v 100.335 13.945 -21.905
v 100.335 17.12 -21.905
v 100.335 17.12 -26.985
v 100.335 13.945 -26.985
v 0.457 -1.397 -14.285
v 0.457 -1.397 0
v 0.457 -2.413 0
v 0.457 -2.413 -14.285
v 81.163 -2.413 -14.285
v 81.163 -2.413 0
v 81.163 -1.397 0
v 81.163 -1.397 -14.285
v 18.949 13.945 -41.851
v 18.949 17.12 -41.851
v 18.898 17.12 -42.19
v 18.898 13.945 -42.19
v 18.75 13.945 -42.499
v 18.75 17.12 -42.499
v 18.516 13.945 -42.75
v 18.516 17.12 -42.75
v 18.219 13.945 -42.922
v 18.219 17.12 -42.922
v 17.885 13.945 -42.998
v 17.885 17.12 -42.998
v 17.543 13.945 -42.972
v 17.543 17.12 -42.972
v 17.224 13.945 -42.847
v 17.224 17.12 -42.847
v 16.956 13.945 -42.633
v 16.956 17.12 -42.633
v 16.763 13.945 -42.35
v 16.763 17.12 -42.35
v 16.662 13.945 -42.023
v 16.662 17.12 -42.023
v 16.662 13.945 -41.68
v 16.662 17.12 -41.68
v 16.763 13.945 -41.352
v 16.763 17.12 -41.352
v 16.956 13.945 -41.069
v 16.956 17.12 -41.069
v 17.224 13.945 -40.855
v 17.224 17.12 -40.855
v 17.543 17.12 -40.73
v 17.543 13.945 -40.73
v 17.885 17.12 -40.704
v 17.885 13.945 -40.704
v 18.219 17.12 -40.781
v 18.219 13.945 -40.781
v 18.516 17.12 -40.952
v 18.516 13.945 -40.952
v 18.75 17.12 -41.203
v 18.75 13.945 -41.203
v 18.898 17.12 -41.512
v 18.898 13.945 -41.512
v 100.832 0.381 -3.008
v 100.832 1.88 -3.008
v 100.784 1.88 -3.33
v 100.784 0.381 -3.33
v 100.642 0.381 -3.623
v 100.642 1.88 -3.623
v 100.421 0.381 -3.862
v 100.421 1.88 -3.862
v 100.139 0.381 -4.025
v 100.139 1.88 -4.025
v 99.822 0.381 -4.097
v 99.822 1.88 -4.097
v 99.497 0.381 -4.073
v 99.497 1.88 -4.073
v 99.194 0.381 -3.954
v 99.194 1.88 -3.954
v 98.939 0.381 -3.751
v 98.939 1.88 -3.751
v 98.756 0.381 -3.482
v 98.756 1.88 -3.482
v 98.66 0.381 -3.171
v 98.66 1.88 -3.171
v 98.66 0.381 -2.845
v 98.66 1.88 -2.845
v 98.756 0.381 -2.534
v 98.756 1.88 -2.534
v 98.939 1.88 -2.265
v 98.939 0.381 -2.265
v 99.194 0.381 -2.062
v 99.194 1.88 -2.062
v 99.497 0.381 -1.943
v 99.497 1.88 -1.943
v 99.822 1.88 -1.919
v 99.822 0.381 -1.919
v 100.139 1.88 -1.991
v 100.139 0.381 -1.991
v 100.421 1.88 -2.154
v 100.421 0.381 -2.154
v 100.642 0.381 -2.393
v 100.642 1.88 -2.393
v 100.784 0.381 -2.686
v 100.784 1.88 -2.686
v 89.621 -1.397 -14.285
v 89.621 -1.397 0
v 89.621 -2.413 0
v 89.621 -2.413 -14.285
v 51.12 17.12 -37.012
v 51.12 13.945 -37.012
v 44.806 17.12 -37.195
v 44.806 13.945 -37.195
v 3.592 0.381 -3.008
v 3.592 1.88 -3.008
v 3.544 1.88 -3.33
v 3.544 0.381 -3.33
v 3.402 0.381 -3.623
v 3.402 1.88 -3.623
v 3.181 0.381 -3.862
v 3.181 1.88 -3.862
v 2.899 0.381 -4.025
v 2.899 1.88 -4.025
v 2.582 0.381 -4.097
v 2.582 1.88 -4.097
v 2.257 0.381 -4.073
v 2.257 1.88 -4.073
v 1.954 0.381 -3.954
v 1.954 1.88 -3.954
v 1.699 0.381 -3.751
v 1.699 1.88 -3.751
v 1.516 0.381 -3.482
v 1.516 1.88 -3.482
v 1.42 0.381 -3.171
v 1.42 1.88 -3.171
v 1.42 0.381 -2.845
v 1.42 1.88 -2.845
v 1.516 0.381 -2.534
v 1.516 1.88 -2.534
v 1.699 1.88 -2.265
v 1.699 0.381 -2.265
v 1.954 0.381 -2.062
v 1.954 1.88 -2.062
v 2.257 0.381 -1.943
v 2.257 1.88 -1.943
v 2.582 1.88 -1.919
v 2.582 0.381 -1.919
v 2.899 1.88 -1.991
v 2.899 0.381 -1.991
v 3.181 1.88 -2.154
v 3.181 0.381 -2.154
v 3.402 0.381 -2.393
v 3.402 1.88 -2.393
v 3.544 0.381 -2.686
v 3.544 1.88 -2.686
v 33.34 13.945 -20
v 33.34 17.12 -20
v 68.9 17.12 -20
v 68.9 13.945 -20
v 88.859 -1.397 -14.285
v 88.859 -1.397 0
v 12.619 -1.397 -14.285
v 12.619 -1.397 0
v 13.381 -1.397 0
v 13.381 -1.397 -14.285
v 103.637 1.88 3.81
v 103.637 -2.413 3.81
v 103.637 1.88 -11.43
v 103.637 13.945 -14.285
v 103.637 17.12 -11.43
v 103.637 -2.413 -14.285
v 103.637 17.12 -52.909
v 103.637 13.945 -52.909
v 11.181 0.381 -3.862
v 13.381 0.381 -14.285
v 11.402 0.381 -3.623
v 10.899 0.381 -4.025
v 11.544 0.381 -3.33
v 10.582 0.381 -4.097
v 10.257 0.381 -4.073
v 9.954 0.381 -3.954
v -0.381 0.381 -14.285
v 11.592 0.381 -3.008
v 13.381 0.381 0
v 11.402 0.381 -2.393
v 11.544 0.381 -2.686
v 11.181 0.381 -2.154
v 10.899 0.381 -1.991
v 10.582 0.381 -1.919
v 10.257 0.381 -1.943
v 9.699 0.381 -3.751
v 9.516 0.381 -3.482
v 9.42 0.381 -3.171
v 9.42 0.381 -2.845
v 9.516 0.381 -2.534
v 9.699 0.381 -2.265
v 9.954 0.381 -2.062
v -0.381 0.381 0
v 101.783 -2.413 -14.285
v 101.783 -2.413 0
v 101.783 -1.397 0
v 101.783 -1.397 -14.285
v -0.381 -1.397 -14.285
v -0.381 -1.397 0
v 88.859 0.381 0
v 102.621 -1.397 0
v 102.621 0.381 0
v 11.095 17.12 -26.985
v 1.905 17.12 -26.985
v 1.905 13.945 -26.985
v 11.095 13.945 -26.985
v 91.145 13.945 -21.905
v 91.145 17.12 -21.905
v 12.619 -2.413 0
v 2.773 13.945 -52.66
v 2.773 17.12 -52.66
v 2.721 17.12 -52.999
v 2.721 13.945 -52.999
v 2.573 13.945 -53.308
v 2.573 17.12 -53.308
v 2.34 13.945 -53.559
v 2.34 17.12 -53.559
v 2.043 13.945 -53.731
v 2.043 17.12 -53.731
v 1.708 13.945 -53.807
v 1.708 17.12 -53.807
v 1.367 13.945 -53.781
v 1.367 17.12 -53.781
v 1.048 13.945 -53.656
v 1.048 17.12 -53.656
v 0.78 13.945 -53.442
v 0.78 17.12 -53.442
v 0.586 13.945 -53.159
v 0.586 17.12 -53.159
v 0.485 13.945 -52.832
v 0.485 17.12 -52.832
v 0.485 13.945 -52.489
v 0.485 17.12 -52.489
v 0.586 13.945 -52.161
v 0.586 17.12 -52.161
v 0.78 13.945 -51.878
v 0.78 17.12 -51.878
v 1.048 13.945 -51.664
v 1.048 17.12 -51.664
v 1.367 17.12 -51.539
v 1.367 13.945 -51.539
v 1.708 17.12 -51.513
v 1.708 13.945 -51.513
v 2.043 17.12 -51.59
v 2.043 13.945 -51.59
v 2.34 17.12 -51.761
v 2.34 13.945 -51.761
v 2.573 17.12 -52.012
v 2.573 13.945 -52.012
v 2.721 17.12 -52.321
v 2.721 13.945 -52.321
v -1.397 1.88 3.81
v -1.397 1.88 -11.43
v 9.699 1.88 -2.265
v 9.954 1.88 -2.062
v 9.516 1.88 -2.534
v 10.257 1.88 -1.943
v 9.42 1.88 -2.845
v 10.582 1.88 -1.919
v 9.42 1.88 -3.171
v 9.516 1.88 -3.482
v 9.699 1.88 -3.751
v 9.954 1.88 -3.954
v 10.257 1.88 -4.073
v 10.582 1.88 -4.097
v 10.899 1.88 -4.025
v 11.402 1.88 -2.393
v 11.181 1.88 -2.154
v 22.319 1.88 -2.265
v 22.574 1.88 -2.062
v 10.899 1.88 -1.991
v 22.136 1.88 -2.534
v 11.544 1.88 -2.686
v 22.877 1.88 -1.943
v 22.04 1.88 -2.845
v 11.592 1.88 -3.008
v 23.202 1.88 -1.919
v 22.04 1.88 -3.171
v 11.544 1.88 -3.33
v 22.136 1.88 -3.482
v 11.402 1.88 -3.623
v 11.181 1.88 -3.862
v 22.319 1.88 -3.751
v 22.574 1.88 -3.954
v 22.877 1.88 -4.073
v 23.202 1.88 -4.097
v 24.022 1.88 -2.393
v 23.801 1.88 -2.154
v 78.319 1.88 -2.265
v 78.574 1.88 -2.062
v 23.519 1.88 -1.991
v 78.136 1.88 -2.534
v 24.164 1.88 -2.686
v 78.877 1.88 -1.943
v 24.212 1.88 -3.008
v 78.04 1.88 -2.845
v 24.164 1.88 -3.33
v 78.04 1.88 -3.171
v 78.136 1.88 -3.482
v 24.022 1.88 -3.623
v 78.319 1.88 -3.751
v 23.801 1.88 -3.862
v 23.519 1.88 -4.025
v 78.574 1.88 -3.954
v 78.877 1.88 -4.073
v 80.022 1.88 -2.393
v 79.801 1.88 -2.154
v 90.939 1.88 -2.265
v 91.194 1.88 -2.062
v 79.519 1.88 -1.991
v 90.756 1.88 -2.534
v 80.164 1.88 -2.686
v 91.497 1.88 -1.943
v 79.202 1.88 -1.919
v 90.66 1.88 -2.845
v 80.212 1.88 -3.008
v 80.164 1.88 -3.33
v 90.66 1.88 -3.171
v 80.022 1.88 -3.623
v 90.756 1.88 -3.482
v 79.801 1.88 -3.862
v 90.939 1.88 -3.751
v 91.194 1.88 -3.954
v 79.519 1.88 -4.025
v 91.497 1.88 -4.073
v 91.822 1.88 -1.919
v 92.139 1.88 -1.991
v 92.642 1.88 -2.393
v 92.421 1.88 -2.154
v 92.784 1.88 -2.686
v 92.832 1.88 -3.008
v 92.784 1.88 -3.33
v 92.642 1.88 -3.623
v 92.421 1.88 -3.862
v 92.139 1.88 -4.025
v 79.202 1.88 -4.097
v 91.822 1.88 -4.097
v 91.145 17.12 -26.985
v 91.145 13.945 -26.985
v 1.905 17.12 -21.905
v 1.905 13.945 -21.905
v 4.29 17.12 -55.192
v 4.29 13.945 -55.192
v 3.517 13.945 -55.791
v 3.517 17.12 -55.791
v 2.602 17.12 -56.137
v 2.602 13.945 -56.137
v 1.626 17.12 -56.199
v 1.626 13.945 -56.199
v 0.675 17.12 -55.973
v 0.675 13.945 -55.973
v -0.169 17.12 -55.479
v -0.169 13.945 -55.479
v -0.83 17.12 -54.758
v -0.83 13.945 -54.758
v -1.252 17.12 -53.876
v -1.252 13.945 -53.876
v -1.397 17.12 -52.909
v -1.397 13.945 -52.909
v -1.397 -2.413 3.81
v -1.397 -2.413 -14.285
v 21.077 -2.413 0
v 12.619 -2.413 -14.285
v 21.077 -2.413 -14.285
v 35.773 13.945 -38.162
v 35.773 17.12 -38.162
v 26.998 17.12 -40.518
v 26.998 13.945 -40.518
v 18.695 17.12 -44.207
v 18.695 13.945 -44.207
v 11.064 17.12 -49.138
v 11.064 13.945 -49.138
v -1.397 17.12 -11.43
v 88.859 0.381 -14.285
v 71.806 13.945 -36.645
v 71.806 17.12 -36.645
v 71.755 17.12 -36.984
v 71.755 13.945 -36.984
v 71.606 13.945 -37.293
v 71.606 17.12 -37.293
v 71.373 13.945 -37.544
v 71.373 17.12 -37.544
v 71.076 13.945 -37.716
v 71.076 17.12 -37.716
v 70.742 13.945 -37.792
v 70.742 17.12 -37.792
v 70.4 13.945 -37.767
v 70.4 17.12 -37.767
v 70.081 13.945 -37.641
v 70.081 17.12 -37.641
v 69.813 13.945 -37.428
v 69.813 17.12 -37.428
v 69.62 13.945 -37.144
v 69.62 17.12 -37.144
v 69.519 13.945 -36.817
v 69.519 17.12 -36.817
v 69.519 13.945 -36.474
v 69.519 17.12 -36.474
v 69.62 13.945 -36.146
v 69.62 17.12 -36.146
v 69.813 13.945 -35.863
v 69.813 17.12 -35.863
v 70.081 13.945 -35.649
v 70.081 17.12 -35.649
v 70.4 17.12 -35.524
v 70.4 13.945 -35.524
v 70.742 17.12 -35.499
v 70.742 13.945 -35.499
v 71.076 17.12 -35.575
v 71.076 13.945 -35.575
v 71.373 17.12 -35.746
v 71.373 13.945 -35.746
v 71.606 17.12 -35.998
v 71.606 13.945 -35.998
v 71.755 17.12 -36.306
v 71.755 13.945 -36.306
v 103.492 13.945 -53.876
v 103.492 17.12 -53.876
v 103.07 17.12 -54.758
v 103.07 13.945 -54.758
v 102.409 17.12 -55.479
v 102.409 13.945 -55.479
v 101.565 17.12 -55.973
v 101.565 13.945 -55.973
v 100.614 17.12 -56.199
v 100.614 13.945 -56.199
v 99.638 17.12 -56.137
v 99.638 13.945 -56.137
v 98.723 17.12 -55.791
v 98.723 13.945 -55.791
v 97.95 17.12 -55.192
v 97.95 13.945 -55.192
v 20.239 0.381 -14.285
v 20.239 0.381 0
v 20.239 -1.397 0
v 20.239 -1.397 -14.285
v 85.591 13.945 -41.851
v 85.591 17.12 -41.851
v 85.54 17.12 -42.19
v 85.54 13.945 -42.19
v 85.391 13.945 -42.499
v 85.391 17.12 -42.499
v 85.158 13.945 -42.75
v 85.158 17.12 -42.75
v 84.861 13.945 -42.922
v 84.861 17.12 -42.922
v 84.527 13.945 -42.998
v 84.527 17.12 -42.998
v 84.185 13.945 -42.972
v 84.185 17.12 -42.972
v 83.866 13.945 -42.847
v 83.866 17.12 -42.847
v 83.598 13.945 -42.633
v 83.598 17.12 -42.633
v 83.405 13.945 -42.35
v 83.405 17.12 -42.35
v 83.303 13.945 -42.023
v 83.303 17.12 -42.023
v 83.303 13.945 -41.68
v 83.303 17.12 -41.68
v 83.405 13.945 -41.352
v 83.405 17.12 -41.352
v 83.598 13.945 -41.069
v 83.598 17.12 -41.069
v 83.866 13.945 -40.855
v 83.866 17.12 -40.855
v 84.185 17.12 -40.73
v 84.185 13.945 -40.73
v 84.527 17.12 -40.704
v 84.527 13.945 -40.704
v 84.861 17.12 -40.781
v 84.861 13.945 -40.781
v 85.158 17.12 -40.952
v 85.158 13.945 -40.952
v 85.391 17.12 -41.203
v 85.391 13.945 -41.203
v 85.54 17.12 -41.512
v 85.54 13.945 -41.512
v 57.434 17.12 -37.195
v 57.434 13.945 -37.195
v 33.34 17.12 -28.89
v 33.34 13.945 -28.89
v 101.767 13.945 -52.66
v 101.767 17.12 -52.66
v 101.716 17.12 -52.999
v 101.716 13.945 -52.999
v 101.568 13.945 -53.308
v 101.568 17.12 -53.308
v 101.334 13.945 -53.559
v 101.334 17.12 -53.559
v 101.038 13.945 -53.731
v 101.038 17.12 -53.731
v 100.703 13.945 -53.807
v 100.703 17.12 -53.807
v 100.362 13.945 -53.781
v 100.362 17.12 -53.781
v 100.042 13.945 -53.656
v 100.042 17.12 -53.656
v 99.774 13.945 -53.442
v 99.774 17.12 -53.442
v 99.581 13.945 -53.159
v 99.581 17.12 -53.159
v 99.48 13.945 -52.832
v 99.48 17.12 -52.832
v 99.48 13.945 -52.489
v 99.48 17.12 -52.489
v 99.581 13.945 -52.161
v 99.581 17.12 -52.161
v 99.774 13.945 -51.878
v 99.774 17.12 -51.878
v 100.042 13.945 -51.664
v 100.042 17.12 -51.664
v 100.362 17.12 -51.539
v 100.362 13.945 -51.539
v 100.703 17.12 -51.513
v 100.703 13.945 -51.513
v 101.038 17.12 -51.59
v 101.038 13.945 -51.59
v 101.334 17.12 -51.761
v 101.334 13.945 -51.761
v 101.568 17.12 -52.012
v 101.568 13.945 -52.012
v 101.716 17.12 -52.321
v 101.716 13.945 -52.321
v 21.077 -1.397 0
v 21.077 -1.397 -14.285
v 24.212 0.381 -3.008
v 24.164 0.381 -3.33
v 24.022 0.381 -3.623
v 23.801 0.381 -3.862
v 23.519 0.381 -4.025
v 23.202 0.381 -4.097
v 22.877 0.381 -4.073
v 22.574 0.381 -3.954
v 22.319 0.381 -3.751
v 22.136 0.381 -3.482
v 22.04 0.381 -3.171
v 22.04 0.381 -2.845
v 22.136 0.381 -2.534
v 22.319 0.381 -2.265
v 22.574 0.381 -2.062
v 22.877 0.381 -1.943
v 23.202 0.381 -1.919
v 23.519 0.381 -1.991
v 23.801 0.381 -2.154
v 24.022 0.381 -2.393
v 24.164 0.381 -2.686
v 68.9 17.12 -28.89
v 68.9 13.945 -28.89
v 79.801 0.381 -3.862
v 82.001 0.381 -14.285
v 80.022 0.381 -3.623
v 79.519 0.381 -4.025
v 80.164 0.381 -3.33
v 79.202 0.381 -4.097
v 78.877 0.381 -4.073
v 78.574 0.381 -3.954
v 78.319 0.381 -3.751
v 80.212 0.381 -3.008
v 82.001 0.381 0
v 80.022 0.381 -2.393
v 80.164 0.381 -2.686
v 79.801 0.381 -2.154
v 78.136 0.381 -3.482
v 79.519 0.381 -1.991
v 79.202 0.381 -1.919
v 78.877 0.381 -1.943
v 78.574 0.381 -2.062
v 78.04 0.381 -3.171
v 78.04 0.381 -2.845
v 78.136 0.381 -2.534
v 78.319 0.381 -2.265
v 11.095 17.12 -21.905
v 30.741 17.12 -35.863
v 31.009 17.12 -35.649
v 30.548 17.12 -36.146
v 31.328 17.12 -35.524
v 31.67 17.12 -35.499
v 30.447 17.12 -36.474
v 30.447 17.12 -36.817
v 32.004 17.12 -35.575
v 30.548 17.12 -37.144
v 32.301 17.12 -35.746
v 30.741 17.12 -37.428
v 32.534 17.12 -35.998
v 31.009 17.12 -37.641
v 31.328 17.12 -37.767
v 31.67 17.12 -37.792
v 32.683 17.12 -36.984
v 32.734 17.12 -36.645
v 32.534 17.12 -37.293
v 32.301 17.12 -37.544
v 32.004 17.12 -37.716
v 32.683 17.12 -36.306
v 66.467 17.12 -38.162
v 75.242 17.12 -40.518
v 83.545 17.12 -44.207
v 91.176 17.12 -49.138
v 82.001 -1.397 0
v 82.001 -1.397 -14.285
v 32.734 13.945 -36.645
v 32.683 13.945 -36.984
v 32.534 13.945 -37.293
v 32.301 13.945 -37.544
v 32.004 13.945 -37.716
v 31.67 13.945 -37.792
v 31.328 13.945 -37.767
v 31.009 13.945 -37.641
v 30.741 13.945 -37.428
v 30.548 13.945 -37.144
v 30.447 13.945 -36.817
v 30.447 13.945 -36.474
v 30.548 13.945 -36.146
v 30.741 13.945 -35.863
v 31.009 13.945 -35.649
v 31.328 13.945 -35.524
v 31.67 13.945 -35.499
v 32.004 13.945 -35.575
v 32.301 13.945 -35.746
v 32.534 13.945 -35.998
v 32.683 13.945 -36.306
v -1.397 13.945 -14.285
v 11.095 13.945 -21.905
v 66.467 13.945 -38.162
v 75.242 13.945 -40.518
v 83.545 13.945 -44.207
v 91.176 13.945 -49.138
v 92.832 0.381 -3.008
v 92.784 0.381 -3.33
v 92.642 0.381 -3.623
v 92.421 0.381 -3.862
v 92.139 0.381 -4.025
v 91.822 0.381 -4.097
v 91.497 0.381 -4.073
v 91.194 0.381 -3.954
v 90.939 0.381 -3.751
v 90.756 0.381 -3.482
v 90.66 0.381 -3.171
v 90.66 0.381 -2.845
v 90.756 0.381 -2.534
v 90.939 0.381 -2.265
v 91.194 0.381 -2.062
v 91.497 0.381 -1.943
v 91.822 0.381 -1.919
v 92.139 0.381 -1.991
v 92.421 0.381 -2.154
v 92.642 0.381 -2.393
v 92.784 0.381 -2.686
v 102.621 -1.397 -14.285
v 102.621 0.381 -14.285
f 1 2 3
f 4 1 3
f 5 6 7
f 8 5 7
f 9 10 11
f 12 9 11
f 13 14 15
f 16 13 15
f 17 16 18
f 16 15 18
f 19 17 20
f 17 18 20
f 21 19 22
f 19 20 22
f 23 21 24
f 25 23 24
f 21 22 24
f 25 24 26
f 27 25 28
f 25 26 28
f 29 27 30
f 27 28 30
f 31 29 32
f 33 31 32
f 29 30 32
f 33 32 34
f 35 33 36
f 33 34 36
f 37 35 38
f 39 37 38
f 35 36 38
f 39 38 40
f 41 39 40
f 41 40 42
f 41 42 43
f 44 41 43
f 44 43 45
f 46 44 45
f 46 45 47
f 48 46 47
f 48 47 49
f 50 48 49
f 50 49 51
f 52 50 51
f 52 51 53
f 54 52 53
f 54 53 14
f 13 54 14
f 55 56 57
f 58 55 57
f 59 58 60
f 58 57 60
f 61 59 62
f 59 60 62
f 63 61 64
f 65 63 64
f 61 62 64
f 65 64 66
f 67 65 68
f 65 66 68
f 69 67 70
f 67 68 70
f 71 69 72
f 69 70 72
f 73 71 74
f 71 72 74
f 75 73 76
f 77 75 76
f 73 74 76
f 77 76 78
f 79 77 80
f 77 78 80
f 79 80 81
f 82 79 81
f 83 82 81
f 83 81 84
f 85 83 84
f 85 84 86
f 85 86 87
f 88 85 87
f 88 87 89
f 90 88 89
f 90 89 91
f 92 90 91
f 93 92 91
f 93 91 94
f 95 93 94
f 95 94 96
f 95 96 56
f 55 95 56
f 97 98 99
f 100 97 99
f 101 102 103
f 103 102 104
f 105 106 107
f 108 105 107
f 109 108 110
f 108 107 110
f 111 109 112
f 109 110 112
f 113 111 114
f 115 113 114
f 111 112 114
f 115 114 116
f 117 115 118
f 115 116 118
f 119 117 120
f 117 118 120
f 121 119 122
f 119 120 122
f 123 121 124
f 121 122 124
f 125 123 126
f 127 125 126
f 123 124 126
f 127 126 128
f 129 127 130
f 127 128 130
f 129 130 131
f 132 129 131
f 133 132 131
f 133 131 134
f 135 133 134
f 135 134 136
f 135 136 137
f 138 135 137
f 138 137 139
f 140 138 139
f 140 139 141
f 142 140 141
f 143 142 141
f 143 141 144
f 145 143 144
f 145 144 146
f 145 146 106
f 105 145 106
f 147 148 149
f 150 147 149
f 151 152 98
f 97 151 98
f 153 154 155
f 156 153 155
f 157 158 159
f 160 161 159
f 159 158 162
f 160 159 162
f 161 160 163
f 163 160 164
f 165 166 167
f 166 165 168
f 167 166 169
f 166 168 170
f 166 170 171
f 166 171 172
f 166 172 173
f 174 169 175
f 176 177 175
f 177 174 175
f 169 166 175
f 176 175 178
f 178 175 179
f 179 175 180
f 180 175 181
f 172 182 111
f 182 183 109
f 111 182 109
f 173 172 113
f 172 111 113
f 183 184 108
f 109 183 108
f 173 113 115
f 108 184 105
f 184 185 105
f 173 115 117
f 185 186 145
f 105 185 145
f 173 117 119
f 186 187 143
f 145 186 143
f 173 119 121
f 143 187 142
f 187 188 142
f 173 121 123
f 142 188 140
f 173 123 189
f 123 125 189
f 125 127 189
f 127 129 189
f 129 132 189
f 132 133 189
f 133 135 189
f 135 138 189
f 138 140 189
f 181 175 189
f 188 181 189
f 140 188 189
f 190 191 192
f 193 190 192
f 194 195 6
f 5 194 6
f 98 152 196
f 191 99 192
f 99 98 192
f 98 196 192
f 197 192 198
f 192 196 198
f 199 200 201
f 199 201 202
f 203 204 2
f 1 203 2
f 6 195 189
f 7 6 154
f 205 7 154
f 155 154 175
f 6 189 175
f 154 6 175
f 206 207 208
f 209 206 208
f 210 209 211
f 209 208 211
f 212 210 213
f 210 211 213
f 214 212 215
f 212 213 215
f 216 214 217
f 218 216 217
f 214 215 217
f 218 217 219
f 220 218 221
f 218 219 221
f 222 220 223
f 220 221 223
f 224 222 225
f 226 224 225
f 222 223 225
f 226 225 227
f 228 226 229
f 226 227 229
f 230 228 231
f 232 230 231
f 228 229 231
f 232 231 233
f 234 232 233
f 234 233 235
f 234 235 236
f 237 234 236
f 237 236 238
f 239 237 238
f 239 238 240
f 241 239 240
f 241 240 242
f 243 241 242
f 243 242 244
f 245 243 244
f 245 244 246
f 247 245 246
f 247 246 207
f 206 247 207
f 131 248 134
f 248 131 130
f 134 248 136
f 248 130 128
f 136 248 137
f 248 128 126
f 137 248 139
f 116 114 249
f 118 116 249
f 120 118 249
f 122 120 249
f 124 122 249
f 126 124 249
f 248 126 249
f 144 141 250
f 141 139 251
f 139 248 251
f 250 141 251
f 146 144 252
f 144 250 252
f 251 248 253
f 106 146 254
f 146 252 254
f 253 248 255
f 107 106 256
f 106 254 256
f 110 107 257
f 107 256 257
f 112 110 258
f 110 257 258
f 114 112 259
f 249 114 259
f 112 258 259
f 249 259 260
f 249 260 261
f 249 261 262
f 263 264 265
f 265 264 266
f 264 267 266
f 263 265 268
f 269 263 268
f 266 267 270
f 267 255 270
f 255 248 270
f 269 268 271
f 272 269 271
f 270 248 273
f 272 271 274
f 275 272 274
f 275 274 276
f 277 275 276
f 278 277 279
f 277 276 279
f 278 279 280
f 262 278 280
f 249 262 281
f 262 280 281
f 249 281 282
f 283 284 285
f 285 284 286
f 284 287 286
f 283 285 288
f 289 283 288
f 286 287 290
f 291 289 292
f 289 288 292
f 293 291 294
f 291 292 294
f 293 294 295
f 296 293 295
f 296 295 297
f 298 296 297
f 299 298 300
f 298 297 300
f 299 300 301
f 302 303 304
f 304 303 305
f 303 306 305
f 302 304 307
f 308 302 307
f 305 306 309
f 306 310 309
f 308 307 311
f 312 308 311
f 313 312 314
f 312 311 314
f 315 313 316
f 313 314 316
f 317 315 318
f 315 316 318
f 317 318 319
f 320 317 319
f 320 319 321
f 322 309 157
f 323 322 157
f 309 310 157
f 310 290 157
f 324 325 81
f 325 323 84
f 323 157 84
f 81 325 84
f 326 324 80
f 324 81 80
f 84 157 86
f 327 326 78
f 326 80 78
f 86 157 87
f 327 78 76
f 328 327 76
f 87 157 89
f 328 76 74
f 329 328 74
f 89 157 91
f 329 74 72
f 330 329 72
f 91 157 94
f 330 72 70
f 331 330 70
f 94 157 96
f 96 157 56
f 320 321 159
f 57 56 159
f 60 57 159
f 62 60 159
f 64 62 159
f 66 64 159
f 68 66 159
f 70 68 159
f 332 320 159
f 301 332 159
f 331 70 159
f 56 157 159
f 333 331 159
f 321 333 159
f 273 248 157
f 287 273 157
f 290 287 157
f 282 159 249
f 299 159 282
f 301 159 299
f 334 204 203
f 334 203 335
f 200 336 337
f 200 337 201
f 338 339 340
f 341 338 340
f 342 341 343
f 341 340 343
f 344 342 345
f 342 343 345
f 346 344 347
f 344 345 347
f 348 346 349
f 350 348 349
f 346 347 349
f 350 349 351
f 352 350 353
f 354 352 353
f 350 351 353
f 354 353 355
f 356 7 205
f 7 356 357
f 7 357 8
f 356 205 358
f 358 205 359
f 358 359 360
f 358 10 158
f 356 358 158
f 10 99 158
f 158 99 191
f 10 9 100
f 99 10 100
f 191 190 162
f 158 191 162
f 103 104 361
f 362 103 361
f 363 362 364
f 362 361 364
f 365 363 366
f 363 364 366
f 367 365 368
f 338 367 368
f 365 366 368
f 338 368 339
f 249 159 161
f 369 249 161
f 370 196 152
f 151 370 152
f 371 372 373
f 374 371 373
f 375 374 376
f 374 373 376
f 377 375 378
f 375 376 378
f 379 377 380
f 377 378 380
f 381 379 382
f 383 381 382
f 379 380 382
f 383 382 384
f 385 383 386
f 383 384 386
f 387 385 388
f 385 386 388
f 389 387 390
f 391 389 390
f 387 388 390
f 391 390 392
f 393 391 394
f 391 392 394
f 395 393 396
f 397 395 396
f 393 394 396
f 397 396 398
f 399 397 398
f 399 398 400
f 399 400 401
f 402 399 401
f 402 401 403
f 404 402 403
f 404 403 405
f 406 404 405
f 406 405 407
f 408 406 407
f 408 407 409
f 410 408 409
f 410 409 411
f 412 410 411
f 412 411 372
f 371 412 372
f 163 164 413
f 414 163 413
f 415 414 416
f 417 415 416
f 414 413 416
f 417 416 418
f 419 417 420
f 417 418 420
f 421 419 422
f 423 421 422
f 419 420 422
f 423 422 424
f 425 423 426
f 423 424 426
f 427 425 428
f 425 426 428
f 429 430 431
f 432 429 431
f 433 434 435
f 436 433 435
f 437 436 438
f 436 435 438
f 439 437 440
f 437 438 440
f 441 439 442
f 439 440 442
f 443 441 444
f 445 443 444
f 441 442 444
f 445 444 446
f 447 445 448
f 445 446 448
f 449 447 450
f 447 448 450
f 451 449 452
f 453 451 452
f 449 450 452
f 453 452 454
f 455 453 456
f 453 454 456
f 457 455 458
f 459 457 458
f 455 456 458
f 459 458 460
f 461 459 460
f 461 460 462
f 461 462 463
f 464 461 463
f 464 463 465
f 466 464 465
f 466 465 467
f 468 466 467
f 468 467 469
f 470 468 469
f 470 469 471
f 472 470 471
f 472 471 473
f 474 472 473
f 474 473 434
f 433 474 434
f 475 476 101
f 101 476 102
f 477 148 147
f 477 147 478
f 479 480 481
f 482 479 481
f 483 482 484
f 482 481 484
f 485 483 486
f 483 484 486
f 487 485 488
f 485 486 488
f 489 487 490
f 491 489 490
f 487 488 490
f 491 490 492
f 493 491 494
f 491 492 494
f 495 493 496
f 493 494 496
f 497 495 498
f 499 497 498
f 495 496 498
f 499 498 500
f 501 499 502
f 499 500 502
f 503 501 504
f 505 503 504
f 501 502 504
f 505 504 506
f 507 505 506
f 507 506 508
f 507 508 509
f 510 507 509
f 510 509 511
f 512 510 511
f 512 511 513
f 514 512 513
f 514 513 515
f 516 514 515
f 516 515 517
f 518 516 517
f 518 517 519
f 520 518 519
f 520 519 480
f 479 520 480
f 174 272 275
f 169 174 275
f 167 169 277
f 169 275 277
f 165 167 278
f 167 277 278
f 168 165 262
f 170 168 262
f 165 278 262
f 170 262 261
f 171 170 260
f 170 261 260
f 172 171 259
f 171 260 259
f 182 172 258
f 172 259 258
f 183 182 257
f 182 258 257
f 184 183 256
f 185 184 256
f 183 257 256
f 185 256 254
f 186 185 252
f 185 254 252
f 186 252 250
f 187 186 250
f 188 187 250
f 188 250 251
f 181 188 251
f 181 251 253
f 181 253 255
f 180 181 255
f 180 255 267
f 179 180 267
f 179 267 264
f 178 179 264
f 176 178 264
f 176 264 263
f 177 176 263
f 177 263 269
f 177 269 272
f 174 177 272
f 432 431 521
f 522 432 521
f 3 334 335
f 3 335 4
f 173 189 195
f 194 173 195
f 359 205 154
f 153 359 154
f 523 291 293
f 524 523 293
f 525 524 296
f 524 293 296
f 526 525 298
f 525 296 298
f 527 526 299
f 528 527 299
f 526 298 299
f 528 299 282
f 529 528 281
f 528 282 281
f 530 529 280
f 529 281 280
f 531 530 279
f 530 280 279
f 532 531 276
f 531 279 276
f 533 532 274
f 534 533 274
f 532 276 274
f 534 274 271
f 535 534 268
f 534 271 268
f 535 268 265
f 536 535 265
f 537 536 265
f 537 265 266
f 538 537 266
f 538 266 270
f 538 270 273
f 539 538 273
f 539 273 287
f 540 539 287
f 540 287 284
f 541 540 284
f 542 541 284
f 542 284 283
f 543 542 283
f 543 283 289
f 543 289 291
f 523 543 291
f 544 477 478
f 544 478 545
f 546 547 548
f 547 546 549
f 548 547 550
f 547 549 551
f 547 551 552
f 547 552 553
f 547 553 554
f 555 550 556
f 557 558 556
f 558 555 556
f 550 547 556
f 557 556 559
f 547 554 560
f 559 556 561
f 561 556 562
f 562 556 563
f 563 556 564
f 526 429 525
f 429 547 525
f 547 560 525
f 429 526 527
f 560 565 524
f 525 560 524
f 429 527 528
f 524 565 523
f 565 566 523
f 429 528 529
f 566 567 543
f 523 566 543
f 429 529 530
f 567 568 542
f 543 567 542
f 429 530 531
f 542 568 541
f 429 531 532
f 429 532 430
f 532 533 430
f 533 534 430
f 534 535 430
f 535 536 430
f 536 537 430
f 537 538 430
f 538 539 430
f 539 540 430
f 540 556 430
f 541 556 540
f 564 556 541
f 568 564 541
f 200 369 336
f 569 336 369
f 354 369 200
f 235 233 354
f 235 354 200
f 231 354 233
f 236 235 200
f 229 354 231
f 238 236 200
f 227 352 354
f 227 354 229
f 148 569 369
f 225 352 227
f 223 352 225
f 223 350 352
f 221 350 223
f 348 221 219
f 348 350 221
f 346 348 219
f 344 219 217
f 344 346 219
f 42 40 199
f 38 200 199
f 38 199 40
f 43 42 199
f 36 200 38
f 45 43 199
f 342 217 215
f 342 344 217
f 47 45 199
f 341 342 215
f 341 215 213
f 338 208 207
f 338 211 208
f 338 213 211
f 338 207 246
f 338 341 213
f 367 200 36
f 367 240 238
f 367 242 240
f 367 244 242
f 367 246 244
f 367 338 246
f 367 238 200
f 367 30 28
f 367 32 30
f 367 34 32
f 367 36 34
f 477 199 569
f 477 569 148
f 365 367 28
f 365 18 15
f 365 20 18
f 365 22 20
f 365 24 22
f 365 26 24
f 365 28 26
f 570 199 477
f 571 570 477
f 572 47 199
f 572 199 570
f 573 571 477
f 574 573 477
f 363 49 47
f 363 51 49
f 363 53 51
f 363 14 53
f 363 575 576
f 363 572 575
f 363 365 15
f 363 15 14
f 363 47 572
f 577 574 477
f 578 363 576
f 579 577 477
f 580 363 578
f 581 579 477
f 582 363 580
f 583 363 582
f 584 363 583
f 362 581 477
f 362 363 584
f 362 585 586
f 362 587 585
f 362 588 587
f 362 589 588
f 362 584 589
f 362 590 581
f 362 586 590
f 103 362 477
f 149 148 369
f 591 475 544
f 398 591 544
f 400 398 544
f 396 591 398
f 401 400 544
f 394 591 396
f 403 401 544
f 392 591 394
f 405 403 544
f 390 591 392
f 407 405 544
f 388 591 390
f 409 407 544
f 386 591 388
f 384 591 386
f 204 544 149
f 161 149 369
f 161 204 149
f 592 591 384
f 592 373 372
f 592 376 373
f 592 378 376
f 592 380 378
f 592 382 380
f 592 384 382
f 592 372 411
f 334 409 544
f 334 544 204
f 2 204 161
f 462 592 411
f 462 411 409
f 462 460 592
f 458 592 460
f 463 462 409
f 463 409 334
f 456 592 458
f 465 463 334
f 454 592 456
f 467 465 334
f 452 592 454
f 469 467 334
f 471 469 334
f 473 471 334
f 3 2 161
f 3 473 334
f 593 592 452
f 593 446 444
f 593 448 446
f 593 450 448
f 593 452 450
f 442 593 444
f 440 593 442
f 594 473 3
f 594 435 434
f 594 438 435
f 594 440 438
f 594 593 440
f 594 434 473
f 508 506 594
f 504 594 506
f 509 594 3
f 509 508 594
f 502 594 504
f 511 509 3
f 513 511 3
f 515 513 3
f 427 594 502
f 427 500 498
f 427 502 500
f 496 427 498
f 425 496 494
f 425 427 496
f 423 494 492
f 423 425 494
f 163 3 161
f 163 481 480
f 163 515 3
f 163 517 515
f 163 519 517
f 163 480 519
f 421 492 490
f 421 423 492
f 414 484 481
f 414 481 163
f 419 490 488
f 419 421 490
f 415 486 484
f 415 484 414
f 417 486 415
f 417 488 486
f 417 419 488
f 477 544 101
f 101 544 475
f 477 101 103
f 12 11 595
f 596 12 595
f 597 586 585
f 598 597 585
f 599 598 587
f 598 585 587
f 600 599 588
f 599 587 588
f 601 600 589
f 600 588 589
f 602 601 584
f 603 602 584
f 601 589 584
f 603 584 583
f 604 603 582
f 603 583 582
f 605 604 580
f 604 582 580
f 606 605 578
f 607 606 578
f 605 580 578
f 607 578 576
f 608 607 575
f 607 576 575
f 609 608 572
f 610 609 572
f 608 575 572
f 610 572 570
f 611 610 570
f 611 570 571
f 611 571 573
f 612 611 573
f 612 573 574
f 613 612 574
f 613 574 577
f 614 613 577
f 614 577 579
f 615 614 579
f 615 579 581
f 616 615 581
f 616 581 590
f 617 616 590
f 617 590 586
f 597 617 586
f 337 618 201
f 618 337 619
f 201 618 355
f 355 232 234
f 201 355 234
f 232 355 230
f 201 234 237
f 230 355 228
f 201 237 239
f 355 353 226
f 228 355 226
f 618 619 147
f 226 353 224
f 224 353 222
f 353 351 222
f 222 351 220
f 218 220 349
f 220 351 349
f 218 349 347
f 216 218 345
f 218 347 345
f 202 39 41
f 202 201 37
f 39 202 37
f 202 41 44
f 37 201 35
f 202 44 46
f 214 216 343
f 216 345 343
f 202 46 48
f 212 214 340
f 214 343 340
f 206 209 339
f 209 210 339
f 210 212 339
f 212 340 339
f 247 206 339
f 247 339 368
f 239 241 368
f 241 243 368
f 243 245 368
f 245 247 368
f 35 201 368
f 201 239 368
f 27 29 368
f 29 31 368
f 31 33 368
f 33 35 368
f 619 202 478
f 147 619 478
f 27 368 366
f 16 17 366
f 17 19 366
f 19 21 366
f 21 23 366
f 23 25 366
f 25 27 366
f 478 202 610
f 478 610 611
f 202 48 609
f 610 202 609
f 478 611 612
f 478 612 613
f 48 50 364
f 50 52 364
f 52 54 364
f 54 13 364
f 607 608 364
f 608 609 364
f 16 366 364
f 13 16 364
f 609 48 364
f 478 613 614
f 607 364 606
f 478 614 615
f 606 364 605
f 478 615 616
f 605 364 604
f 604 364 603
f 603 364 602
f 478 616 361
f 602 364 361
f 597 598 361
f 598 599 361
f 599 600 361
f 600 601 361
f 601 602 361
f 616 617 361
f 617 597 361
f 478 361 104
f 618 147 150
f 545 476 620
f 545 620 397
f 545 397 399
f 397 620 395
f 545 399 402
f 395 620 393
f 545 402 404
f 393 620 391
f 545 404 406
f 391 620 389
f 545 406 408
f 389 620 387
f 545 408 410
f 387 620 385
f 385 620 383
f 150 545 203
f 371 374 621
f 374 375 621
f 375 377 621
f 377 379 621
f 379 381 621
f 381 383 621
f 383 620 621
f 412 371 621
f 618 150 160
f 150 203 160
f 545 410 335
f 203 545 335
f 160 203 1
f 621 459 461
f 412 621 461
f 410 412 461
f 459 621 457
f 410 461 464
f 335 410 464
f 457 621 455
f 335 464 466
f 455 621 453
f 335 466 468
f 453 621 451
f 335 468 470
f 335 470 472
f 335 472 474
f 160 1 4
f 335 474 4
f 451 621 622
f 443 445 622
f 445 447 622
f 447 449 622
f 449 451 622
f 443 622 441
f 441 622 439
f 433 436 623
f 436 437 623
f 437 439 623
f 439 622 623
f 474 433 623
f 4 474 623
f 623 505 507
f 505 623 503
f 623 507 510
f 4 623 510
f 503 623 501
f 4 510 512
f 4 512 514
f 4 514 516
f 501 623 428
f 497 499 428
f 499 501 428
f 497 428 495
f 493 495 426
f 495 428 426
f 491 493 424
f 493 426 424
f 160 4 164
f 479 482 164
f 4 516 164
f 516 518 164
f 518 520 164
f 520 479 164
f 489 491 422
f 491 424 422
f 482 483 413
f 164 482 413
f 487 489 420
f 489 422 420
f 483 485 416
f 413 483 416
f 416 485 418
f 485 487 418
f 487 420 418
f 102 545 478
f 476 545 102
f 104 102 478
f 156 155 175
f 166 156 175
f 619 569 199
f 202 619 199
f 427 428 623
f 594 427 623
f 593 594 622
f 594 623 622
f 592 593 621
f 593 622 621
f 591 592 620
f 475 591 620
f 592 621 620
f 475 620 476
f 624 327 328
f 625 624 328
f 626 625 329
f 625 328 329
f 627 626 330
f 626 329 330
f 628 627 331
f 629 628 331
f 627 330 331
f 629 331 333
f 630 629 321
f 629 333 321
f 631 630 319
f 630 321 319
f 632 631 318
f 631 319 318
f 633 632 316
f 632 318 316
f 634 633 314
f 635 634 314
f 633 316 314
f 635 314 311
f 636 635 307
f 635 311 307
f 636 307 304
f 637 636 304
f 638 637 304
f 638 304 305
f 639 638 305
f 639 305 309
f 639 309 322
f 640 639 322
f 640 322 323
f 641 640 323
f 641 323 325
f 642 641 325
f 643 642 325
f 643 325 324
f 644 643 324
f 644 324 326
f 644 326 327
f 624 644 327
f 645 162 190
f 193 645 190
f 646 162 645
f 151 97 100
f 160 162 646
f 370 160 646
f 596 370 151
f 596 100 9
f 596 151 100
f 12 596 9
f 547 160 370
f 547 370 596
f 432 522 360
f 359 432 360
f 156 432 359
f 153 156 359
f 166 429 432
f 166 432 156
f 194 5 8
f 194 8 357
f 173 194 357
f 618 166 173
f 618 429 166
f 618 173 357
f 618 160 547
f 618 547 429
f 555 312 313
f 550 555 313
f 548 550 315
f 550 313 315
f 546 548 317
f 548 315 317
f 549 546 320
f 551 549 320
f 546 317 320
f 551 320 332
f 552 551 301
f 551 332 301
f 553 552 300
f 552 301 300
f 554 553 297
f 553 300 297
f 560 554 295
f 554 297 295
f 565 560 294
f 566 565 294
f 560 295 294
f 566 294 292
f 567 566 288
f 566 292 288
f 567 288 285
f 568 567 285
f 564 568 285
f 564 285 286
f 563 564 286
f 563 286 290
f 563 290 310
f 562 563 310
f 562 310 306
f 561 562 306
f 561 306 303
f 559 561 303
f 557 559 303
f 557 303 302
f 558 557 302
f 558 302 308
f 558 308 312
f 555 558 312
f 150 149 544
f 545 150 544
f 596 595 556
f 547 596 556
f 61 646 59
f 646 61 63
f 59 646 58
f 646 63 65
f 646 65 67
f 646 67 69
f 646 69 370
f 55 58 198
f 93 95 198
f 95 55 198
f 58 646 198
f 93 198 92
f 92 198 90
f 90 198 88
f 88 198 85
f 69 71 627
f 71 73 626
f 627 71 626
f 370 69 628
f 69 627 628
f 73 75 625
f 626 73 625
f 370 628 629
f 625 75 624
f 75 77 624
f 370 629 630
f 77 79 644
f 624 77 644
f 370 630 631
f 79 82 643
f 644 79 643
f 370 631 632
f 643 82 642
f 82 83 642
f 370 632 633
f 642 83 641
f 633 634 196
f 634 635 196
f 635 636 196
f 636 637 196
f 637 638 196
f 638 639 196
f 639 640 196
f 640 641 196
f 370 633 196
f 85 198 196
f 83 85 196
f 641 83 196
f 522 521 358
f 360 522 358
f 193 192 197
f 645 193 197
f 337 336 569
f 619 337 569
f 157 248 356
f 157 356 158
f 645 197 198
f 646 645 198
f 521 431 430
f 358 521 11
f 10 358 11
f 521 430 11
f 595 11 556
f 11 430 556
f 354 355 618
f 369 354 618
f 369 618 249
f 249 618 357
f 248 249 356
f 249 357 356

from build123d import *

# Parameters (mm, degrees)
BOSS_EXTRUDE2_DEPTH = 14.285
SKETCH4_W           = 105.034
SKETCH4_H           = 3.81
BOSS_EXTRUDE3_DEPTH = 19.533
SKETCH5_W           = 15.24
SKETCH5_H           = 15.24
CUT_EXTRUDE1_DEPTH  = 105.034
BOSS_EXTRUDE7_START = -3.175
BOSS_EXTRUDE7_DEPTH = 3.175
CUT_EXTRUDE2_REACH  = 21.533
SKETCH9_R           = 1.15
SKETCH9_W           = 35.56
SKETCH9_H           = 8.89
SKETCH9_W_2         = 9.19
SKETCH9_H_2         = 5.08
CUT_EXTRUDE3_REACH  = 6.293
SKETCH13_R          = 1.0922


with BuildPart() as part:
    # Sketch1 → Boss-Extrude2 (new body)
    with BuildSketch(Plane.XY):
        Polygon((13.381, 0.381), (-0.381, 0.381), (-0.381, -1.397), (0.4572, -1.397), (0.4572, -2.413), (-1.397, -2.413), (-1.397, 1.397), (-1.397, 17.12), (103.637, 17.12), (103.637, 1.397), (103.637, -2.413), (101.7828, -2.413), (101.7828, -1.397), (102.621, -1.397), (102.621, 0.381), (88.859, 0.381), (88.859, -1.397), (89.621, -1.397), (89.621, -2.413), (87.843, -2.413), (83.017, -2.413), (81.1628, -2.413), (81.1628, -1.397), (82.001, -1.397), (82.001, 0.381), (20.239, 0.381), (20.239, -1.397), (21.0772, -1.397), (21.0772, -2.413), (19.223, -2.413), (14.397, -2.413), (12.619, -2.413), (12.619, -1.397), (13.381, -1.397), align=None)
    extrude(amount=-BOSS_EXTRUDE2_DEPTH)

    # Sketch4 → Boss-Extrude3 (add)
    with BuildSketch(Plane(origin=(0, 17.12, 0), x_dir=(1, 0, 0), z_dir=(0, 1, 0))):
        with Locations((51.12, -1.905)):
            Rectangle(SKETCH4_W, SKETCH4_H)
    extrude(amount=-BOSS_EXTRUDE3_DEPTH)

    # Sketch5 → Cut-Extrude1 (cut)
    with BuildSketch(Plane(origin=(103.637, 0, 0), x_dir=(0, 0, -1), z_dir=(1, 0, 0))):
        with Locations((3.81, 9.5)):
            Rectangle(SKETCH5_W, SKETCH5_H)
    extrude(amount=-CUT_EXTRUDE1_DEPTH, mode=Mode.SUBTRACT)

    # Sketch8 → Boss-Extrude7 (add)
    with BuildSketch(Plane(origin=(0, 17.12, 0), x_dir=(1, 0, 0), z_dir=(0, 1, 0)).offset(BOSS_EXTRUDE7_START)):
        with BuildLine():
            Line((-1.397, 52.90899931), (-1.397, 14.285))
            Line((-1.397, 14.285), (103.637, 14.285))
            Line((103.637, 14.285), (103.637, 52.90899931))
            ThreePointArc((103.637, 52.90899931), (101.565258526, 55.97325582), (97.949738971, 55.192359514))
            ThreePointArc((97.949738971, 55.192359514), (79.465238701, 42.200806947), (57.433563247, 37.194564339))
            Line((57.433563247, 37.194564339), (51.12, 37.012430992))
            Line((51.12, 37.012430992), (44.806436753, 37.194564339))
            ThreePointArc((44.806436753, 37.194564339), (22.774761299, 42.200806947), (4.290261029, 55.192359514))
            ThreePointArc((4.290261029, 55.192359514), (0.674741474, 55.97325582), (-1.397, 52.90899931))
        make_face()
    extrude(amount=BOSS_EXTRUDE7_DEPTH)

    # Sketch9 → Cut-Extrude2 (cut, up to next)
    with BuildSketch(Plane(origin=(0, 17.12, 0), x_dir=(1, 0, 0), z_dir=(0, 1, 0)), mode=Mode.PRIVATE) as cut_extrude2_sk1:
        with Locations((100.617474683, 52.660280557)):
            Circle(SKETCH9_R)
    cut_extrude2_tool1 = extrude(cut_extrude2_sk1.sketch, amount=-CUT_EXTRUDE2_REACH, mode=Mode.PRIVATE) & part.part
    add(cut_extrude2_tool1.solids().sort_by_distance((100.617475, 17.12, -52.660281))[0], mode=Mode.SUBTRACT)
    # Sketch9 → Cut-Extrude2 (cut, up to next)
    with BuildSketch(Plane(origin=(0, 17.12, 0), x_dir=(1, 0, 0), z_dir=(0, 1, 0)), mode=Mode.PRIVATE) as cut_extrude2_sk2:
        with Locations((84.44065509, 41.851275276)):
            Circle(SKETCH9_R)
    cut_extrude2_tool2 = extrude(cut_extrude2_sk2.sketch, amount=-CUT_EXTRUDE2_REACH, mode=Mode.PRIVATE) & part.part
    add(cut_extrude2_tool2.solids().sort_by_distance((84.440655, 17.12, -41.851275))[0], mode=Mode.SUBTRACT)
    # Sketch9 → Cut-Extrude2 (cut, up to next)
    with BuildSketch(Plane(origin=(0, 17.12, 0), x_dir=(1, 0, 0), z_dir=(0, 1, 0)), mode=Mode.PRIVATE) as cut_extrude2_sk3:
        with Locations((70.655700553, 36.645378632)):
            Circle(SKETCH9_R)
    cut_extrude2_tool3 = extrude(cut_extrude2_sk3.sketch, amount=-CUT_EXTRUDE2_REACH, mode=Mode.PRIVATE) & part.part
    add(cut_extrude2_tool3.solids().sort_by_distance((70.655701, 17.12, -36.645379))[0], mode=Mode.SUBTRACT)
    # Sketch9 → Cut-Extrude2 (cut, up to next)
    with BuildSketch(Plane(origin=(0, 17.12, 0), x_dir=(1, 0, 0), z_dir=(0, 1, 0)), mode=Mode.PRIVATE) as cut_extrude2_sk4:
        with Locations((31.584299447, 36.645378632)):
            Circle(SKETCH9_R)
    cut_extrude2_tool4 = extrude(cut_extrude2_sk4.sketch, amount=-CUT_EXTRUDE2_REACH, mode=Mode.PRIVATE) & part.part
    add(cut_extrude2_tool4.solids().sort_by_distance((31.584299, 17.12, -36.645379))[0], mode=Mode.SUBTRACT)
    # Sketch9 → Cut-Extrude2 (cut, up to next)
    with BuildSketch(Plane(origin=(0, 17.12, 0), x_dir=(1, 0, 0), z_dir=(0, 1, 0)), mode=Mode.PRIVATE) as cut_extrude2_sk5:
        with Locations((17.79934491, 41.851275276)):
            Circle(SKETCH9_R)
    cut_extrude2_tool5 = extrude(cut_extrude2_sk5.sketch, amount=-CUT_EXTRUDE2_REACH, mode=Mode.PRIVATE) & part.part
    add(cut_extrude2_tool5.solids().sort_by_distance((17.799345, 17.12, -41.851275))[0], mode=Mode.SUBTRACT)
    # Sketch9 → Cut-Extrude2 (cut, up to next)
    with BuildSketch(Plane(origin=(0, 17.12, 0), x_dir=(1, 0, 0), z_dir=(0, 1, 0)), mode=Mode.PRIVATE) as cut_extrude2_sk6:
        with Locations((1.622525317, 52.660280557)):
            Circle(SKETCH9_R)
    cut_extrude2_tool6 = extrude(cut_extrude2_sk6.sketch, amount=-CUT_EXTRUDE2_REACH, mode=Mode.PRIVATE) & part.part
    add(cut_extrude2_tool6.solids().sort_by_distance((1.622525, 17.12, -52.660281))[0], mode=Mode.SUBTRACT)
    # Sketch9 → Cut-Extrude2 (cut, up to next)
    with BuildSketch(Plane(origin=(0, 17.12, 0), x_dir=(1, 0, 0), z_dir=(0, 1, 0)), mode=Mode.PRIVATE) as cut_extrude2_sk7:
        with Locations((51.1199898, 24.445)):
            Rectangle(SKETCH9_W, SKETCH9_H)
    cut_extrude2_tool7 = extrude(cut_extrude2_sk7.sketch, amount=-CUT_EXTRUDE2_REACH, mode=Mode.PRIVATE) & part.part
    add(cut_extrude2_tool7.solids().sort_by_distance((51.11999, 17.12, -24.445))[0], mode=Mode.SUBTRACT)
    # Sketch9 → Cut-Extrude2 (cut, up to next)
    with BuildSketch(Plane(origin=(0, 17.12, 0), x_dir=(1, 0, 0), z_dir=(0, 1, 0)), mode=Mode.PRIVATE) as cut_extrude2_sk8:
        with Locations((6.5, 24.445)):
            Rectangle(SKETCH9_W_2, SKETCH9_H_2)
    cut_extrude2_tool8 = extrude(cut_extrude2_sk8.sketch, amount=-CUT_EXTRUDE2_REACH, mode=Mode.PRIVATE) & part.part
    add(cut_extrude2_tool8.solids().sort_by_distance((6.5, 17.12, -24.445))[0], mode=Mode.SUBTRACT)
    # Sketch9 → Cut-Extrude2 (cut, up to next)
    with BuildSketch(Plane(origin=(0, 17.12, 0), x_dir=(1, 0, 0), z_dir=(0, 1, 0)), mode=Mode.PRIVATE) as cut_extrude2_sk9:
        with Locations((95.74, 24.445)):
            Rectangle(SKETCH9_W_2, SKETCH9_H_2)
    cut_extrude2_tool9 = extrude(cut_extrude2_sk9.sketch, amount=-CUT_EXTRUDE2_REACH, mode=Mode.PRIVATE) & part.part
    add(cut_extrude2_tool9.solids().sort_by_distance((95.74, 17.12, -24.445))[0], mode=Mode.SUBTRACT)

    # Sketch13 → Cut-Extrude3 (cut, up to next)
    with BuildSketch(Plane(origin=(0, 1.88, 0), x_dir=(1, 0, 0), z_dir=(0, 1, 0)), mode=Mode.PRIVATE) as cut_extrude3_sk1:
        with Locations((23.12, 3.008)):
            Circle(SKETCH13_R)
    cut_extrude3_tool1 = extrude(cut_extrude3_sk1.sketch, amount=-CUT_EXTRUDE3_REACH, mode=Mode.PRIVATE) & part.part
    add(cut_extrude3_tool1.solids().sort_by_distance((23.12, 1.88, -3.008))[0], mode=Mode.SUBTRACT)
    # Sketch13 → Cut-Extrude3 (cut, up to next)
    with BuildSketch(Plane(origin=(0, 1.88, 0), x_dir=(1, 0, 0), z_dir=(0, 1, 0)), mode=Mode.PRIVATE) as cut_extrude3_sk2:
        with Locations((10.5, 3.008)):
            Circle(SKETCH13_R)
    cut_extrude3_tool2 = extrude(cut_extrude3_sk2.sketch, amount=-CUT_EXTRUDE3_REACH, mode=Mode.PRIVATE) & part.part
    add(cut_extrude3_tool2.solids().sort_by_distance((10.5, 1.88, -3.008))[0], mode=Mode.SUBTRACT)
    # Sketch13 → Cut-Extrude3 (cut, up to next)
    with BuildSketch(Plane(origin=(0, 1.88, 0), x_dir=(1, 0, 0), z_dir=(0, 1, 0)), mode=Mode.PRIVATE) as cut_extrude3_sk3:
        with Locations((2.5, 3.008)):
            Circle(SKETCH13_R)
    cut_extrude3_tool3 = extrude(cut_extrude3_sk3.sketch, amount=-CUT_EXTRUDE3_REACH, mode=Mode.PRIVATE) & part.part
    add(cut_extrude3_tool3.solids().sort_by_distance((2.5, 1.88, -3.008))[0], mode=Mode.SUBTRACT)
    # Sketch13 → Cut-Extrude3 (cut, up to next)
    with BuildSketch(Plane(origin=(0, 1.88, 0), x_dir=(1, 0, 0), z_dir=(0, 1, 0)), mode=Mode.PRIVATE) as cut_extrude3_sk4:
        with Locations((79.12, 3.008)):
            Circle(SKETCH13_R)
    cut_extrude3_tool4 = extrude(cut_extrude3_sk4.sketch, amount=-CUT_EXTRUDE3_REACH, mode=Mode.PRIVATE) & part.part
    add(cut_extrude3_tool4.solids().sort_by_distance((79.12, 1.88, -3.008))[0], mode=Mode.SUBTRACT)
    # Sketch13 → Cut-Extrude3 (cut, up to next)
    with BuildSketch(Plane(origin=(0, 1.88, 0), x_dir=(1, 0, 0), z_dir=(0, 1, 0)), mode=Mode.PRIVATE) as cut_extrude3_sk5:
        with Locations((91.74, 3.008)):
            Circle(SKETCH13_R)
    cut_extrude3_tool5 = extrude(cut_extrude3_sk5.sketch, amount=-CUT_EXTRUDE3_REACH, mode=Mode.PRIVATE) & part.part
    add(cut_extrude3_tool5.solids().sort_by_distance((91.74, 1.88, -3.008))[0], mode=Mode.SUBTRACT)
    # Sketch13 → Cut-Extrude3 (cut, up to next)
    with BuildSketch(Plane(origin=(0, 1.88, 0), x_dir=(1, 0, 0), z_dir=(0, 1, 0)), mode=Mode.PRIVATE) as cut_extrude3_sk6:
        with Locations((99.74, 3.008)):
            Circle(SKETCH13_R)
    cut_extrude3_tool6 = extrude(cut_extrude3_sk6.sketch, amount=-CUT_EXTRUDE3_REACH, mode=Mode.PRIVATE) & part.part
    add(cut_extrude3_tool6.solids().sort_by_distance((99.74, 1.88, -3.008))[0], mode=Mode.SUBTRACT)


solid = part.part
